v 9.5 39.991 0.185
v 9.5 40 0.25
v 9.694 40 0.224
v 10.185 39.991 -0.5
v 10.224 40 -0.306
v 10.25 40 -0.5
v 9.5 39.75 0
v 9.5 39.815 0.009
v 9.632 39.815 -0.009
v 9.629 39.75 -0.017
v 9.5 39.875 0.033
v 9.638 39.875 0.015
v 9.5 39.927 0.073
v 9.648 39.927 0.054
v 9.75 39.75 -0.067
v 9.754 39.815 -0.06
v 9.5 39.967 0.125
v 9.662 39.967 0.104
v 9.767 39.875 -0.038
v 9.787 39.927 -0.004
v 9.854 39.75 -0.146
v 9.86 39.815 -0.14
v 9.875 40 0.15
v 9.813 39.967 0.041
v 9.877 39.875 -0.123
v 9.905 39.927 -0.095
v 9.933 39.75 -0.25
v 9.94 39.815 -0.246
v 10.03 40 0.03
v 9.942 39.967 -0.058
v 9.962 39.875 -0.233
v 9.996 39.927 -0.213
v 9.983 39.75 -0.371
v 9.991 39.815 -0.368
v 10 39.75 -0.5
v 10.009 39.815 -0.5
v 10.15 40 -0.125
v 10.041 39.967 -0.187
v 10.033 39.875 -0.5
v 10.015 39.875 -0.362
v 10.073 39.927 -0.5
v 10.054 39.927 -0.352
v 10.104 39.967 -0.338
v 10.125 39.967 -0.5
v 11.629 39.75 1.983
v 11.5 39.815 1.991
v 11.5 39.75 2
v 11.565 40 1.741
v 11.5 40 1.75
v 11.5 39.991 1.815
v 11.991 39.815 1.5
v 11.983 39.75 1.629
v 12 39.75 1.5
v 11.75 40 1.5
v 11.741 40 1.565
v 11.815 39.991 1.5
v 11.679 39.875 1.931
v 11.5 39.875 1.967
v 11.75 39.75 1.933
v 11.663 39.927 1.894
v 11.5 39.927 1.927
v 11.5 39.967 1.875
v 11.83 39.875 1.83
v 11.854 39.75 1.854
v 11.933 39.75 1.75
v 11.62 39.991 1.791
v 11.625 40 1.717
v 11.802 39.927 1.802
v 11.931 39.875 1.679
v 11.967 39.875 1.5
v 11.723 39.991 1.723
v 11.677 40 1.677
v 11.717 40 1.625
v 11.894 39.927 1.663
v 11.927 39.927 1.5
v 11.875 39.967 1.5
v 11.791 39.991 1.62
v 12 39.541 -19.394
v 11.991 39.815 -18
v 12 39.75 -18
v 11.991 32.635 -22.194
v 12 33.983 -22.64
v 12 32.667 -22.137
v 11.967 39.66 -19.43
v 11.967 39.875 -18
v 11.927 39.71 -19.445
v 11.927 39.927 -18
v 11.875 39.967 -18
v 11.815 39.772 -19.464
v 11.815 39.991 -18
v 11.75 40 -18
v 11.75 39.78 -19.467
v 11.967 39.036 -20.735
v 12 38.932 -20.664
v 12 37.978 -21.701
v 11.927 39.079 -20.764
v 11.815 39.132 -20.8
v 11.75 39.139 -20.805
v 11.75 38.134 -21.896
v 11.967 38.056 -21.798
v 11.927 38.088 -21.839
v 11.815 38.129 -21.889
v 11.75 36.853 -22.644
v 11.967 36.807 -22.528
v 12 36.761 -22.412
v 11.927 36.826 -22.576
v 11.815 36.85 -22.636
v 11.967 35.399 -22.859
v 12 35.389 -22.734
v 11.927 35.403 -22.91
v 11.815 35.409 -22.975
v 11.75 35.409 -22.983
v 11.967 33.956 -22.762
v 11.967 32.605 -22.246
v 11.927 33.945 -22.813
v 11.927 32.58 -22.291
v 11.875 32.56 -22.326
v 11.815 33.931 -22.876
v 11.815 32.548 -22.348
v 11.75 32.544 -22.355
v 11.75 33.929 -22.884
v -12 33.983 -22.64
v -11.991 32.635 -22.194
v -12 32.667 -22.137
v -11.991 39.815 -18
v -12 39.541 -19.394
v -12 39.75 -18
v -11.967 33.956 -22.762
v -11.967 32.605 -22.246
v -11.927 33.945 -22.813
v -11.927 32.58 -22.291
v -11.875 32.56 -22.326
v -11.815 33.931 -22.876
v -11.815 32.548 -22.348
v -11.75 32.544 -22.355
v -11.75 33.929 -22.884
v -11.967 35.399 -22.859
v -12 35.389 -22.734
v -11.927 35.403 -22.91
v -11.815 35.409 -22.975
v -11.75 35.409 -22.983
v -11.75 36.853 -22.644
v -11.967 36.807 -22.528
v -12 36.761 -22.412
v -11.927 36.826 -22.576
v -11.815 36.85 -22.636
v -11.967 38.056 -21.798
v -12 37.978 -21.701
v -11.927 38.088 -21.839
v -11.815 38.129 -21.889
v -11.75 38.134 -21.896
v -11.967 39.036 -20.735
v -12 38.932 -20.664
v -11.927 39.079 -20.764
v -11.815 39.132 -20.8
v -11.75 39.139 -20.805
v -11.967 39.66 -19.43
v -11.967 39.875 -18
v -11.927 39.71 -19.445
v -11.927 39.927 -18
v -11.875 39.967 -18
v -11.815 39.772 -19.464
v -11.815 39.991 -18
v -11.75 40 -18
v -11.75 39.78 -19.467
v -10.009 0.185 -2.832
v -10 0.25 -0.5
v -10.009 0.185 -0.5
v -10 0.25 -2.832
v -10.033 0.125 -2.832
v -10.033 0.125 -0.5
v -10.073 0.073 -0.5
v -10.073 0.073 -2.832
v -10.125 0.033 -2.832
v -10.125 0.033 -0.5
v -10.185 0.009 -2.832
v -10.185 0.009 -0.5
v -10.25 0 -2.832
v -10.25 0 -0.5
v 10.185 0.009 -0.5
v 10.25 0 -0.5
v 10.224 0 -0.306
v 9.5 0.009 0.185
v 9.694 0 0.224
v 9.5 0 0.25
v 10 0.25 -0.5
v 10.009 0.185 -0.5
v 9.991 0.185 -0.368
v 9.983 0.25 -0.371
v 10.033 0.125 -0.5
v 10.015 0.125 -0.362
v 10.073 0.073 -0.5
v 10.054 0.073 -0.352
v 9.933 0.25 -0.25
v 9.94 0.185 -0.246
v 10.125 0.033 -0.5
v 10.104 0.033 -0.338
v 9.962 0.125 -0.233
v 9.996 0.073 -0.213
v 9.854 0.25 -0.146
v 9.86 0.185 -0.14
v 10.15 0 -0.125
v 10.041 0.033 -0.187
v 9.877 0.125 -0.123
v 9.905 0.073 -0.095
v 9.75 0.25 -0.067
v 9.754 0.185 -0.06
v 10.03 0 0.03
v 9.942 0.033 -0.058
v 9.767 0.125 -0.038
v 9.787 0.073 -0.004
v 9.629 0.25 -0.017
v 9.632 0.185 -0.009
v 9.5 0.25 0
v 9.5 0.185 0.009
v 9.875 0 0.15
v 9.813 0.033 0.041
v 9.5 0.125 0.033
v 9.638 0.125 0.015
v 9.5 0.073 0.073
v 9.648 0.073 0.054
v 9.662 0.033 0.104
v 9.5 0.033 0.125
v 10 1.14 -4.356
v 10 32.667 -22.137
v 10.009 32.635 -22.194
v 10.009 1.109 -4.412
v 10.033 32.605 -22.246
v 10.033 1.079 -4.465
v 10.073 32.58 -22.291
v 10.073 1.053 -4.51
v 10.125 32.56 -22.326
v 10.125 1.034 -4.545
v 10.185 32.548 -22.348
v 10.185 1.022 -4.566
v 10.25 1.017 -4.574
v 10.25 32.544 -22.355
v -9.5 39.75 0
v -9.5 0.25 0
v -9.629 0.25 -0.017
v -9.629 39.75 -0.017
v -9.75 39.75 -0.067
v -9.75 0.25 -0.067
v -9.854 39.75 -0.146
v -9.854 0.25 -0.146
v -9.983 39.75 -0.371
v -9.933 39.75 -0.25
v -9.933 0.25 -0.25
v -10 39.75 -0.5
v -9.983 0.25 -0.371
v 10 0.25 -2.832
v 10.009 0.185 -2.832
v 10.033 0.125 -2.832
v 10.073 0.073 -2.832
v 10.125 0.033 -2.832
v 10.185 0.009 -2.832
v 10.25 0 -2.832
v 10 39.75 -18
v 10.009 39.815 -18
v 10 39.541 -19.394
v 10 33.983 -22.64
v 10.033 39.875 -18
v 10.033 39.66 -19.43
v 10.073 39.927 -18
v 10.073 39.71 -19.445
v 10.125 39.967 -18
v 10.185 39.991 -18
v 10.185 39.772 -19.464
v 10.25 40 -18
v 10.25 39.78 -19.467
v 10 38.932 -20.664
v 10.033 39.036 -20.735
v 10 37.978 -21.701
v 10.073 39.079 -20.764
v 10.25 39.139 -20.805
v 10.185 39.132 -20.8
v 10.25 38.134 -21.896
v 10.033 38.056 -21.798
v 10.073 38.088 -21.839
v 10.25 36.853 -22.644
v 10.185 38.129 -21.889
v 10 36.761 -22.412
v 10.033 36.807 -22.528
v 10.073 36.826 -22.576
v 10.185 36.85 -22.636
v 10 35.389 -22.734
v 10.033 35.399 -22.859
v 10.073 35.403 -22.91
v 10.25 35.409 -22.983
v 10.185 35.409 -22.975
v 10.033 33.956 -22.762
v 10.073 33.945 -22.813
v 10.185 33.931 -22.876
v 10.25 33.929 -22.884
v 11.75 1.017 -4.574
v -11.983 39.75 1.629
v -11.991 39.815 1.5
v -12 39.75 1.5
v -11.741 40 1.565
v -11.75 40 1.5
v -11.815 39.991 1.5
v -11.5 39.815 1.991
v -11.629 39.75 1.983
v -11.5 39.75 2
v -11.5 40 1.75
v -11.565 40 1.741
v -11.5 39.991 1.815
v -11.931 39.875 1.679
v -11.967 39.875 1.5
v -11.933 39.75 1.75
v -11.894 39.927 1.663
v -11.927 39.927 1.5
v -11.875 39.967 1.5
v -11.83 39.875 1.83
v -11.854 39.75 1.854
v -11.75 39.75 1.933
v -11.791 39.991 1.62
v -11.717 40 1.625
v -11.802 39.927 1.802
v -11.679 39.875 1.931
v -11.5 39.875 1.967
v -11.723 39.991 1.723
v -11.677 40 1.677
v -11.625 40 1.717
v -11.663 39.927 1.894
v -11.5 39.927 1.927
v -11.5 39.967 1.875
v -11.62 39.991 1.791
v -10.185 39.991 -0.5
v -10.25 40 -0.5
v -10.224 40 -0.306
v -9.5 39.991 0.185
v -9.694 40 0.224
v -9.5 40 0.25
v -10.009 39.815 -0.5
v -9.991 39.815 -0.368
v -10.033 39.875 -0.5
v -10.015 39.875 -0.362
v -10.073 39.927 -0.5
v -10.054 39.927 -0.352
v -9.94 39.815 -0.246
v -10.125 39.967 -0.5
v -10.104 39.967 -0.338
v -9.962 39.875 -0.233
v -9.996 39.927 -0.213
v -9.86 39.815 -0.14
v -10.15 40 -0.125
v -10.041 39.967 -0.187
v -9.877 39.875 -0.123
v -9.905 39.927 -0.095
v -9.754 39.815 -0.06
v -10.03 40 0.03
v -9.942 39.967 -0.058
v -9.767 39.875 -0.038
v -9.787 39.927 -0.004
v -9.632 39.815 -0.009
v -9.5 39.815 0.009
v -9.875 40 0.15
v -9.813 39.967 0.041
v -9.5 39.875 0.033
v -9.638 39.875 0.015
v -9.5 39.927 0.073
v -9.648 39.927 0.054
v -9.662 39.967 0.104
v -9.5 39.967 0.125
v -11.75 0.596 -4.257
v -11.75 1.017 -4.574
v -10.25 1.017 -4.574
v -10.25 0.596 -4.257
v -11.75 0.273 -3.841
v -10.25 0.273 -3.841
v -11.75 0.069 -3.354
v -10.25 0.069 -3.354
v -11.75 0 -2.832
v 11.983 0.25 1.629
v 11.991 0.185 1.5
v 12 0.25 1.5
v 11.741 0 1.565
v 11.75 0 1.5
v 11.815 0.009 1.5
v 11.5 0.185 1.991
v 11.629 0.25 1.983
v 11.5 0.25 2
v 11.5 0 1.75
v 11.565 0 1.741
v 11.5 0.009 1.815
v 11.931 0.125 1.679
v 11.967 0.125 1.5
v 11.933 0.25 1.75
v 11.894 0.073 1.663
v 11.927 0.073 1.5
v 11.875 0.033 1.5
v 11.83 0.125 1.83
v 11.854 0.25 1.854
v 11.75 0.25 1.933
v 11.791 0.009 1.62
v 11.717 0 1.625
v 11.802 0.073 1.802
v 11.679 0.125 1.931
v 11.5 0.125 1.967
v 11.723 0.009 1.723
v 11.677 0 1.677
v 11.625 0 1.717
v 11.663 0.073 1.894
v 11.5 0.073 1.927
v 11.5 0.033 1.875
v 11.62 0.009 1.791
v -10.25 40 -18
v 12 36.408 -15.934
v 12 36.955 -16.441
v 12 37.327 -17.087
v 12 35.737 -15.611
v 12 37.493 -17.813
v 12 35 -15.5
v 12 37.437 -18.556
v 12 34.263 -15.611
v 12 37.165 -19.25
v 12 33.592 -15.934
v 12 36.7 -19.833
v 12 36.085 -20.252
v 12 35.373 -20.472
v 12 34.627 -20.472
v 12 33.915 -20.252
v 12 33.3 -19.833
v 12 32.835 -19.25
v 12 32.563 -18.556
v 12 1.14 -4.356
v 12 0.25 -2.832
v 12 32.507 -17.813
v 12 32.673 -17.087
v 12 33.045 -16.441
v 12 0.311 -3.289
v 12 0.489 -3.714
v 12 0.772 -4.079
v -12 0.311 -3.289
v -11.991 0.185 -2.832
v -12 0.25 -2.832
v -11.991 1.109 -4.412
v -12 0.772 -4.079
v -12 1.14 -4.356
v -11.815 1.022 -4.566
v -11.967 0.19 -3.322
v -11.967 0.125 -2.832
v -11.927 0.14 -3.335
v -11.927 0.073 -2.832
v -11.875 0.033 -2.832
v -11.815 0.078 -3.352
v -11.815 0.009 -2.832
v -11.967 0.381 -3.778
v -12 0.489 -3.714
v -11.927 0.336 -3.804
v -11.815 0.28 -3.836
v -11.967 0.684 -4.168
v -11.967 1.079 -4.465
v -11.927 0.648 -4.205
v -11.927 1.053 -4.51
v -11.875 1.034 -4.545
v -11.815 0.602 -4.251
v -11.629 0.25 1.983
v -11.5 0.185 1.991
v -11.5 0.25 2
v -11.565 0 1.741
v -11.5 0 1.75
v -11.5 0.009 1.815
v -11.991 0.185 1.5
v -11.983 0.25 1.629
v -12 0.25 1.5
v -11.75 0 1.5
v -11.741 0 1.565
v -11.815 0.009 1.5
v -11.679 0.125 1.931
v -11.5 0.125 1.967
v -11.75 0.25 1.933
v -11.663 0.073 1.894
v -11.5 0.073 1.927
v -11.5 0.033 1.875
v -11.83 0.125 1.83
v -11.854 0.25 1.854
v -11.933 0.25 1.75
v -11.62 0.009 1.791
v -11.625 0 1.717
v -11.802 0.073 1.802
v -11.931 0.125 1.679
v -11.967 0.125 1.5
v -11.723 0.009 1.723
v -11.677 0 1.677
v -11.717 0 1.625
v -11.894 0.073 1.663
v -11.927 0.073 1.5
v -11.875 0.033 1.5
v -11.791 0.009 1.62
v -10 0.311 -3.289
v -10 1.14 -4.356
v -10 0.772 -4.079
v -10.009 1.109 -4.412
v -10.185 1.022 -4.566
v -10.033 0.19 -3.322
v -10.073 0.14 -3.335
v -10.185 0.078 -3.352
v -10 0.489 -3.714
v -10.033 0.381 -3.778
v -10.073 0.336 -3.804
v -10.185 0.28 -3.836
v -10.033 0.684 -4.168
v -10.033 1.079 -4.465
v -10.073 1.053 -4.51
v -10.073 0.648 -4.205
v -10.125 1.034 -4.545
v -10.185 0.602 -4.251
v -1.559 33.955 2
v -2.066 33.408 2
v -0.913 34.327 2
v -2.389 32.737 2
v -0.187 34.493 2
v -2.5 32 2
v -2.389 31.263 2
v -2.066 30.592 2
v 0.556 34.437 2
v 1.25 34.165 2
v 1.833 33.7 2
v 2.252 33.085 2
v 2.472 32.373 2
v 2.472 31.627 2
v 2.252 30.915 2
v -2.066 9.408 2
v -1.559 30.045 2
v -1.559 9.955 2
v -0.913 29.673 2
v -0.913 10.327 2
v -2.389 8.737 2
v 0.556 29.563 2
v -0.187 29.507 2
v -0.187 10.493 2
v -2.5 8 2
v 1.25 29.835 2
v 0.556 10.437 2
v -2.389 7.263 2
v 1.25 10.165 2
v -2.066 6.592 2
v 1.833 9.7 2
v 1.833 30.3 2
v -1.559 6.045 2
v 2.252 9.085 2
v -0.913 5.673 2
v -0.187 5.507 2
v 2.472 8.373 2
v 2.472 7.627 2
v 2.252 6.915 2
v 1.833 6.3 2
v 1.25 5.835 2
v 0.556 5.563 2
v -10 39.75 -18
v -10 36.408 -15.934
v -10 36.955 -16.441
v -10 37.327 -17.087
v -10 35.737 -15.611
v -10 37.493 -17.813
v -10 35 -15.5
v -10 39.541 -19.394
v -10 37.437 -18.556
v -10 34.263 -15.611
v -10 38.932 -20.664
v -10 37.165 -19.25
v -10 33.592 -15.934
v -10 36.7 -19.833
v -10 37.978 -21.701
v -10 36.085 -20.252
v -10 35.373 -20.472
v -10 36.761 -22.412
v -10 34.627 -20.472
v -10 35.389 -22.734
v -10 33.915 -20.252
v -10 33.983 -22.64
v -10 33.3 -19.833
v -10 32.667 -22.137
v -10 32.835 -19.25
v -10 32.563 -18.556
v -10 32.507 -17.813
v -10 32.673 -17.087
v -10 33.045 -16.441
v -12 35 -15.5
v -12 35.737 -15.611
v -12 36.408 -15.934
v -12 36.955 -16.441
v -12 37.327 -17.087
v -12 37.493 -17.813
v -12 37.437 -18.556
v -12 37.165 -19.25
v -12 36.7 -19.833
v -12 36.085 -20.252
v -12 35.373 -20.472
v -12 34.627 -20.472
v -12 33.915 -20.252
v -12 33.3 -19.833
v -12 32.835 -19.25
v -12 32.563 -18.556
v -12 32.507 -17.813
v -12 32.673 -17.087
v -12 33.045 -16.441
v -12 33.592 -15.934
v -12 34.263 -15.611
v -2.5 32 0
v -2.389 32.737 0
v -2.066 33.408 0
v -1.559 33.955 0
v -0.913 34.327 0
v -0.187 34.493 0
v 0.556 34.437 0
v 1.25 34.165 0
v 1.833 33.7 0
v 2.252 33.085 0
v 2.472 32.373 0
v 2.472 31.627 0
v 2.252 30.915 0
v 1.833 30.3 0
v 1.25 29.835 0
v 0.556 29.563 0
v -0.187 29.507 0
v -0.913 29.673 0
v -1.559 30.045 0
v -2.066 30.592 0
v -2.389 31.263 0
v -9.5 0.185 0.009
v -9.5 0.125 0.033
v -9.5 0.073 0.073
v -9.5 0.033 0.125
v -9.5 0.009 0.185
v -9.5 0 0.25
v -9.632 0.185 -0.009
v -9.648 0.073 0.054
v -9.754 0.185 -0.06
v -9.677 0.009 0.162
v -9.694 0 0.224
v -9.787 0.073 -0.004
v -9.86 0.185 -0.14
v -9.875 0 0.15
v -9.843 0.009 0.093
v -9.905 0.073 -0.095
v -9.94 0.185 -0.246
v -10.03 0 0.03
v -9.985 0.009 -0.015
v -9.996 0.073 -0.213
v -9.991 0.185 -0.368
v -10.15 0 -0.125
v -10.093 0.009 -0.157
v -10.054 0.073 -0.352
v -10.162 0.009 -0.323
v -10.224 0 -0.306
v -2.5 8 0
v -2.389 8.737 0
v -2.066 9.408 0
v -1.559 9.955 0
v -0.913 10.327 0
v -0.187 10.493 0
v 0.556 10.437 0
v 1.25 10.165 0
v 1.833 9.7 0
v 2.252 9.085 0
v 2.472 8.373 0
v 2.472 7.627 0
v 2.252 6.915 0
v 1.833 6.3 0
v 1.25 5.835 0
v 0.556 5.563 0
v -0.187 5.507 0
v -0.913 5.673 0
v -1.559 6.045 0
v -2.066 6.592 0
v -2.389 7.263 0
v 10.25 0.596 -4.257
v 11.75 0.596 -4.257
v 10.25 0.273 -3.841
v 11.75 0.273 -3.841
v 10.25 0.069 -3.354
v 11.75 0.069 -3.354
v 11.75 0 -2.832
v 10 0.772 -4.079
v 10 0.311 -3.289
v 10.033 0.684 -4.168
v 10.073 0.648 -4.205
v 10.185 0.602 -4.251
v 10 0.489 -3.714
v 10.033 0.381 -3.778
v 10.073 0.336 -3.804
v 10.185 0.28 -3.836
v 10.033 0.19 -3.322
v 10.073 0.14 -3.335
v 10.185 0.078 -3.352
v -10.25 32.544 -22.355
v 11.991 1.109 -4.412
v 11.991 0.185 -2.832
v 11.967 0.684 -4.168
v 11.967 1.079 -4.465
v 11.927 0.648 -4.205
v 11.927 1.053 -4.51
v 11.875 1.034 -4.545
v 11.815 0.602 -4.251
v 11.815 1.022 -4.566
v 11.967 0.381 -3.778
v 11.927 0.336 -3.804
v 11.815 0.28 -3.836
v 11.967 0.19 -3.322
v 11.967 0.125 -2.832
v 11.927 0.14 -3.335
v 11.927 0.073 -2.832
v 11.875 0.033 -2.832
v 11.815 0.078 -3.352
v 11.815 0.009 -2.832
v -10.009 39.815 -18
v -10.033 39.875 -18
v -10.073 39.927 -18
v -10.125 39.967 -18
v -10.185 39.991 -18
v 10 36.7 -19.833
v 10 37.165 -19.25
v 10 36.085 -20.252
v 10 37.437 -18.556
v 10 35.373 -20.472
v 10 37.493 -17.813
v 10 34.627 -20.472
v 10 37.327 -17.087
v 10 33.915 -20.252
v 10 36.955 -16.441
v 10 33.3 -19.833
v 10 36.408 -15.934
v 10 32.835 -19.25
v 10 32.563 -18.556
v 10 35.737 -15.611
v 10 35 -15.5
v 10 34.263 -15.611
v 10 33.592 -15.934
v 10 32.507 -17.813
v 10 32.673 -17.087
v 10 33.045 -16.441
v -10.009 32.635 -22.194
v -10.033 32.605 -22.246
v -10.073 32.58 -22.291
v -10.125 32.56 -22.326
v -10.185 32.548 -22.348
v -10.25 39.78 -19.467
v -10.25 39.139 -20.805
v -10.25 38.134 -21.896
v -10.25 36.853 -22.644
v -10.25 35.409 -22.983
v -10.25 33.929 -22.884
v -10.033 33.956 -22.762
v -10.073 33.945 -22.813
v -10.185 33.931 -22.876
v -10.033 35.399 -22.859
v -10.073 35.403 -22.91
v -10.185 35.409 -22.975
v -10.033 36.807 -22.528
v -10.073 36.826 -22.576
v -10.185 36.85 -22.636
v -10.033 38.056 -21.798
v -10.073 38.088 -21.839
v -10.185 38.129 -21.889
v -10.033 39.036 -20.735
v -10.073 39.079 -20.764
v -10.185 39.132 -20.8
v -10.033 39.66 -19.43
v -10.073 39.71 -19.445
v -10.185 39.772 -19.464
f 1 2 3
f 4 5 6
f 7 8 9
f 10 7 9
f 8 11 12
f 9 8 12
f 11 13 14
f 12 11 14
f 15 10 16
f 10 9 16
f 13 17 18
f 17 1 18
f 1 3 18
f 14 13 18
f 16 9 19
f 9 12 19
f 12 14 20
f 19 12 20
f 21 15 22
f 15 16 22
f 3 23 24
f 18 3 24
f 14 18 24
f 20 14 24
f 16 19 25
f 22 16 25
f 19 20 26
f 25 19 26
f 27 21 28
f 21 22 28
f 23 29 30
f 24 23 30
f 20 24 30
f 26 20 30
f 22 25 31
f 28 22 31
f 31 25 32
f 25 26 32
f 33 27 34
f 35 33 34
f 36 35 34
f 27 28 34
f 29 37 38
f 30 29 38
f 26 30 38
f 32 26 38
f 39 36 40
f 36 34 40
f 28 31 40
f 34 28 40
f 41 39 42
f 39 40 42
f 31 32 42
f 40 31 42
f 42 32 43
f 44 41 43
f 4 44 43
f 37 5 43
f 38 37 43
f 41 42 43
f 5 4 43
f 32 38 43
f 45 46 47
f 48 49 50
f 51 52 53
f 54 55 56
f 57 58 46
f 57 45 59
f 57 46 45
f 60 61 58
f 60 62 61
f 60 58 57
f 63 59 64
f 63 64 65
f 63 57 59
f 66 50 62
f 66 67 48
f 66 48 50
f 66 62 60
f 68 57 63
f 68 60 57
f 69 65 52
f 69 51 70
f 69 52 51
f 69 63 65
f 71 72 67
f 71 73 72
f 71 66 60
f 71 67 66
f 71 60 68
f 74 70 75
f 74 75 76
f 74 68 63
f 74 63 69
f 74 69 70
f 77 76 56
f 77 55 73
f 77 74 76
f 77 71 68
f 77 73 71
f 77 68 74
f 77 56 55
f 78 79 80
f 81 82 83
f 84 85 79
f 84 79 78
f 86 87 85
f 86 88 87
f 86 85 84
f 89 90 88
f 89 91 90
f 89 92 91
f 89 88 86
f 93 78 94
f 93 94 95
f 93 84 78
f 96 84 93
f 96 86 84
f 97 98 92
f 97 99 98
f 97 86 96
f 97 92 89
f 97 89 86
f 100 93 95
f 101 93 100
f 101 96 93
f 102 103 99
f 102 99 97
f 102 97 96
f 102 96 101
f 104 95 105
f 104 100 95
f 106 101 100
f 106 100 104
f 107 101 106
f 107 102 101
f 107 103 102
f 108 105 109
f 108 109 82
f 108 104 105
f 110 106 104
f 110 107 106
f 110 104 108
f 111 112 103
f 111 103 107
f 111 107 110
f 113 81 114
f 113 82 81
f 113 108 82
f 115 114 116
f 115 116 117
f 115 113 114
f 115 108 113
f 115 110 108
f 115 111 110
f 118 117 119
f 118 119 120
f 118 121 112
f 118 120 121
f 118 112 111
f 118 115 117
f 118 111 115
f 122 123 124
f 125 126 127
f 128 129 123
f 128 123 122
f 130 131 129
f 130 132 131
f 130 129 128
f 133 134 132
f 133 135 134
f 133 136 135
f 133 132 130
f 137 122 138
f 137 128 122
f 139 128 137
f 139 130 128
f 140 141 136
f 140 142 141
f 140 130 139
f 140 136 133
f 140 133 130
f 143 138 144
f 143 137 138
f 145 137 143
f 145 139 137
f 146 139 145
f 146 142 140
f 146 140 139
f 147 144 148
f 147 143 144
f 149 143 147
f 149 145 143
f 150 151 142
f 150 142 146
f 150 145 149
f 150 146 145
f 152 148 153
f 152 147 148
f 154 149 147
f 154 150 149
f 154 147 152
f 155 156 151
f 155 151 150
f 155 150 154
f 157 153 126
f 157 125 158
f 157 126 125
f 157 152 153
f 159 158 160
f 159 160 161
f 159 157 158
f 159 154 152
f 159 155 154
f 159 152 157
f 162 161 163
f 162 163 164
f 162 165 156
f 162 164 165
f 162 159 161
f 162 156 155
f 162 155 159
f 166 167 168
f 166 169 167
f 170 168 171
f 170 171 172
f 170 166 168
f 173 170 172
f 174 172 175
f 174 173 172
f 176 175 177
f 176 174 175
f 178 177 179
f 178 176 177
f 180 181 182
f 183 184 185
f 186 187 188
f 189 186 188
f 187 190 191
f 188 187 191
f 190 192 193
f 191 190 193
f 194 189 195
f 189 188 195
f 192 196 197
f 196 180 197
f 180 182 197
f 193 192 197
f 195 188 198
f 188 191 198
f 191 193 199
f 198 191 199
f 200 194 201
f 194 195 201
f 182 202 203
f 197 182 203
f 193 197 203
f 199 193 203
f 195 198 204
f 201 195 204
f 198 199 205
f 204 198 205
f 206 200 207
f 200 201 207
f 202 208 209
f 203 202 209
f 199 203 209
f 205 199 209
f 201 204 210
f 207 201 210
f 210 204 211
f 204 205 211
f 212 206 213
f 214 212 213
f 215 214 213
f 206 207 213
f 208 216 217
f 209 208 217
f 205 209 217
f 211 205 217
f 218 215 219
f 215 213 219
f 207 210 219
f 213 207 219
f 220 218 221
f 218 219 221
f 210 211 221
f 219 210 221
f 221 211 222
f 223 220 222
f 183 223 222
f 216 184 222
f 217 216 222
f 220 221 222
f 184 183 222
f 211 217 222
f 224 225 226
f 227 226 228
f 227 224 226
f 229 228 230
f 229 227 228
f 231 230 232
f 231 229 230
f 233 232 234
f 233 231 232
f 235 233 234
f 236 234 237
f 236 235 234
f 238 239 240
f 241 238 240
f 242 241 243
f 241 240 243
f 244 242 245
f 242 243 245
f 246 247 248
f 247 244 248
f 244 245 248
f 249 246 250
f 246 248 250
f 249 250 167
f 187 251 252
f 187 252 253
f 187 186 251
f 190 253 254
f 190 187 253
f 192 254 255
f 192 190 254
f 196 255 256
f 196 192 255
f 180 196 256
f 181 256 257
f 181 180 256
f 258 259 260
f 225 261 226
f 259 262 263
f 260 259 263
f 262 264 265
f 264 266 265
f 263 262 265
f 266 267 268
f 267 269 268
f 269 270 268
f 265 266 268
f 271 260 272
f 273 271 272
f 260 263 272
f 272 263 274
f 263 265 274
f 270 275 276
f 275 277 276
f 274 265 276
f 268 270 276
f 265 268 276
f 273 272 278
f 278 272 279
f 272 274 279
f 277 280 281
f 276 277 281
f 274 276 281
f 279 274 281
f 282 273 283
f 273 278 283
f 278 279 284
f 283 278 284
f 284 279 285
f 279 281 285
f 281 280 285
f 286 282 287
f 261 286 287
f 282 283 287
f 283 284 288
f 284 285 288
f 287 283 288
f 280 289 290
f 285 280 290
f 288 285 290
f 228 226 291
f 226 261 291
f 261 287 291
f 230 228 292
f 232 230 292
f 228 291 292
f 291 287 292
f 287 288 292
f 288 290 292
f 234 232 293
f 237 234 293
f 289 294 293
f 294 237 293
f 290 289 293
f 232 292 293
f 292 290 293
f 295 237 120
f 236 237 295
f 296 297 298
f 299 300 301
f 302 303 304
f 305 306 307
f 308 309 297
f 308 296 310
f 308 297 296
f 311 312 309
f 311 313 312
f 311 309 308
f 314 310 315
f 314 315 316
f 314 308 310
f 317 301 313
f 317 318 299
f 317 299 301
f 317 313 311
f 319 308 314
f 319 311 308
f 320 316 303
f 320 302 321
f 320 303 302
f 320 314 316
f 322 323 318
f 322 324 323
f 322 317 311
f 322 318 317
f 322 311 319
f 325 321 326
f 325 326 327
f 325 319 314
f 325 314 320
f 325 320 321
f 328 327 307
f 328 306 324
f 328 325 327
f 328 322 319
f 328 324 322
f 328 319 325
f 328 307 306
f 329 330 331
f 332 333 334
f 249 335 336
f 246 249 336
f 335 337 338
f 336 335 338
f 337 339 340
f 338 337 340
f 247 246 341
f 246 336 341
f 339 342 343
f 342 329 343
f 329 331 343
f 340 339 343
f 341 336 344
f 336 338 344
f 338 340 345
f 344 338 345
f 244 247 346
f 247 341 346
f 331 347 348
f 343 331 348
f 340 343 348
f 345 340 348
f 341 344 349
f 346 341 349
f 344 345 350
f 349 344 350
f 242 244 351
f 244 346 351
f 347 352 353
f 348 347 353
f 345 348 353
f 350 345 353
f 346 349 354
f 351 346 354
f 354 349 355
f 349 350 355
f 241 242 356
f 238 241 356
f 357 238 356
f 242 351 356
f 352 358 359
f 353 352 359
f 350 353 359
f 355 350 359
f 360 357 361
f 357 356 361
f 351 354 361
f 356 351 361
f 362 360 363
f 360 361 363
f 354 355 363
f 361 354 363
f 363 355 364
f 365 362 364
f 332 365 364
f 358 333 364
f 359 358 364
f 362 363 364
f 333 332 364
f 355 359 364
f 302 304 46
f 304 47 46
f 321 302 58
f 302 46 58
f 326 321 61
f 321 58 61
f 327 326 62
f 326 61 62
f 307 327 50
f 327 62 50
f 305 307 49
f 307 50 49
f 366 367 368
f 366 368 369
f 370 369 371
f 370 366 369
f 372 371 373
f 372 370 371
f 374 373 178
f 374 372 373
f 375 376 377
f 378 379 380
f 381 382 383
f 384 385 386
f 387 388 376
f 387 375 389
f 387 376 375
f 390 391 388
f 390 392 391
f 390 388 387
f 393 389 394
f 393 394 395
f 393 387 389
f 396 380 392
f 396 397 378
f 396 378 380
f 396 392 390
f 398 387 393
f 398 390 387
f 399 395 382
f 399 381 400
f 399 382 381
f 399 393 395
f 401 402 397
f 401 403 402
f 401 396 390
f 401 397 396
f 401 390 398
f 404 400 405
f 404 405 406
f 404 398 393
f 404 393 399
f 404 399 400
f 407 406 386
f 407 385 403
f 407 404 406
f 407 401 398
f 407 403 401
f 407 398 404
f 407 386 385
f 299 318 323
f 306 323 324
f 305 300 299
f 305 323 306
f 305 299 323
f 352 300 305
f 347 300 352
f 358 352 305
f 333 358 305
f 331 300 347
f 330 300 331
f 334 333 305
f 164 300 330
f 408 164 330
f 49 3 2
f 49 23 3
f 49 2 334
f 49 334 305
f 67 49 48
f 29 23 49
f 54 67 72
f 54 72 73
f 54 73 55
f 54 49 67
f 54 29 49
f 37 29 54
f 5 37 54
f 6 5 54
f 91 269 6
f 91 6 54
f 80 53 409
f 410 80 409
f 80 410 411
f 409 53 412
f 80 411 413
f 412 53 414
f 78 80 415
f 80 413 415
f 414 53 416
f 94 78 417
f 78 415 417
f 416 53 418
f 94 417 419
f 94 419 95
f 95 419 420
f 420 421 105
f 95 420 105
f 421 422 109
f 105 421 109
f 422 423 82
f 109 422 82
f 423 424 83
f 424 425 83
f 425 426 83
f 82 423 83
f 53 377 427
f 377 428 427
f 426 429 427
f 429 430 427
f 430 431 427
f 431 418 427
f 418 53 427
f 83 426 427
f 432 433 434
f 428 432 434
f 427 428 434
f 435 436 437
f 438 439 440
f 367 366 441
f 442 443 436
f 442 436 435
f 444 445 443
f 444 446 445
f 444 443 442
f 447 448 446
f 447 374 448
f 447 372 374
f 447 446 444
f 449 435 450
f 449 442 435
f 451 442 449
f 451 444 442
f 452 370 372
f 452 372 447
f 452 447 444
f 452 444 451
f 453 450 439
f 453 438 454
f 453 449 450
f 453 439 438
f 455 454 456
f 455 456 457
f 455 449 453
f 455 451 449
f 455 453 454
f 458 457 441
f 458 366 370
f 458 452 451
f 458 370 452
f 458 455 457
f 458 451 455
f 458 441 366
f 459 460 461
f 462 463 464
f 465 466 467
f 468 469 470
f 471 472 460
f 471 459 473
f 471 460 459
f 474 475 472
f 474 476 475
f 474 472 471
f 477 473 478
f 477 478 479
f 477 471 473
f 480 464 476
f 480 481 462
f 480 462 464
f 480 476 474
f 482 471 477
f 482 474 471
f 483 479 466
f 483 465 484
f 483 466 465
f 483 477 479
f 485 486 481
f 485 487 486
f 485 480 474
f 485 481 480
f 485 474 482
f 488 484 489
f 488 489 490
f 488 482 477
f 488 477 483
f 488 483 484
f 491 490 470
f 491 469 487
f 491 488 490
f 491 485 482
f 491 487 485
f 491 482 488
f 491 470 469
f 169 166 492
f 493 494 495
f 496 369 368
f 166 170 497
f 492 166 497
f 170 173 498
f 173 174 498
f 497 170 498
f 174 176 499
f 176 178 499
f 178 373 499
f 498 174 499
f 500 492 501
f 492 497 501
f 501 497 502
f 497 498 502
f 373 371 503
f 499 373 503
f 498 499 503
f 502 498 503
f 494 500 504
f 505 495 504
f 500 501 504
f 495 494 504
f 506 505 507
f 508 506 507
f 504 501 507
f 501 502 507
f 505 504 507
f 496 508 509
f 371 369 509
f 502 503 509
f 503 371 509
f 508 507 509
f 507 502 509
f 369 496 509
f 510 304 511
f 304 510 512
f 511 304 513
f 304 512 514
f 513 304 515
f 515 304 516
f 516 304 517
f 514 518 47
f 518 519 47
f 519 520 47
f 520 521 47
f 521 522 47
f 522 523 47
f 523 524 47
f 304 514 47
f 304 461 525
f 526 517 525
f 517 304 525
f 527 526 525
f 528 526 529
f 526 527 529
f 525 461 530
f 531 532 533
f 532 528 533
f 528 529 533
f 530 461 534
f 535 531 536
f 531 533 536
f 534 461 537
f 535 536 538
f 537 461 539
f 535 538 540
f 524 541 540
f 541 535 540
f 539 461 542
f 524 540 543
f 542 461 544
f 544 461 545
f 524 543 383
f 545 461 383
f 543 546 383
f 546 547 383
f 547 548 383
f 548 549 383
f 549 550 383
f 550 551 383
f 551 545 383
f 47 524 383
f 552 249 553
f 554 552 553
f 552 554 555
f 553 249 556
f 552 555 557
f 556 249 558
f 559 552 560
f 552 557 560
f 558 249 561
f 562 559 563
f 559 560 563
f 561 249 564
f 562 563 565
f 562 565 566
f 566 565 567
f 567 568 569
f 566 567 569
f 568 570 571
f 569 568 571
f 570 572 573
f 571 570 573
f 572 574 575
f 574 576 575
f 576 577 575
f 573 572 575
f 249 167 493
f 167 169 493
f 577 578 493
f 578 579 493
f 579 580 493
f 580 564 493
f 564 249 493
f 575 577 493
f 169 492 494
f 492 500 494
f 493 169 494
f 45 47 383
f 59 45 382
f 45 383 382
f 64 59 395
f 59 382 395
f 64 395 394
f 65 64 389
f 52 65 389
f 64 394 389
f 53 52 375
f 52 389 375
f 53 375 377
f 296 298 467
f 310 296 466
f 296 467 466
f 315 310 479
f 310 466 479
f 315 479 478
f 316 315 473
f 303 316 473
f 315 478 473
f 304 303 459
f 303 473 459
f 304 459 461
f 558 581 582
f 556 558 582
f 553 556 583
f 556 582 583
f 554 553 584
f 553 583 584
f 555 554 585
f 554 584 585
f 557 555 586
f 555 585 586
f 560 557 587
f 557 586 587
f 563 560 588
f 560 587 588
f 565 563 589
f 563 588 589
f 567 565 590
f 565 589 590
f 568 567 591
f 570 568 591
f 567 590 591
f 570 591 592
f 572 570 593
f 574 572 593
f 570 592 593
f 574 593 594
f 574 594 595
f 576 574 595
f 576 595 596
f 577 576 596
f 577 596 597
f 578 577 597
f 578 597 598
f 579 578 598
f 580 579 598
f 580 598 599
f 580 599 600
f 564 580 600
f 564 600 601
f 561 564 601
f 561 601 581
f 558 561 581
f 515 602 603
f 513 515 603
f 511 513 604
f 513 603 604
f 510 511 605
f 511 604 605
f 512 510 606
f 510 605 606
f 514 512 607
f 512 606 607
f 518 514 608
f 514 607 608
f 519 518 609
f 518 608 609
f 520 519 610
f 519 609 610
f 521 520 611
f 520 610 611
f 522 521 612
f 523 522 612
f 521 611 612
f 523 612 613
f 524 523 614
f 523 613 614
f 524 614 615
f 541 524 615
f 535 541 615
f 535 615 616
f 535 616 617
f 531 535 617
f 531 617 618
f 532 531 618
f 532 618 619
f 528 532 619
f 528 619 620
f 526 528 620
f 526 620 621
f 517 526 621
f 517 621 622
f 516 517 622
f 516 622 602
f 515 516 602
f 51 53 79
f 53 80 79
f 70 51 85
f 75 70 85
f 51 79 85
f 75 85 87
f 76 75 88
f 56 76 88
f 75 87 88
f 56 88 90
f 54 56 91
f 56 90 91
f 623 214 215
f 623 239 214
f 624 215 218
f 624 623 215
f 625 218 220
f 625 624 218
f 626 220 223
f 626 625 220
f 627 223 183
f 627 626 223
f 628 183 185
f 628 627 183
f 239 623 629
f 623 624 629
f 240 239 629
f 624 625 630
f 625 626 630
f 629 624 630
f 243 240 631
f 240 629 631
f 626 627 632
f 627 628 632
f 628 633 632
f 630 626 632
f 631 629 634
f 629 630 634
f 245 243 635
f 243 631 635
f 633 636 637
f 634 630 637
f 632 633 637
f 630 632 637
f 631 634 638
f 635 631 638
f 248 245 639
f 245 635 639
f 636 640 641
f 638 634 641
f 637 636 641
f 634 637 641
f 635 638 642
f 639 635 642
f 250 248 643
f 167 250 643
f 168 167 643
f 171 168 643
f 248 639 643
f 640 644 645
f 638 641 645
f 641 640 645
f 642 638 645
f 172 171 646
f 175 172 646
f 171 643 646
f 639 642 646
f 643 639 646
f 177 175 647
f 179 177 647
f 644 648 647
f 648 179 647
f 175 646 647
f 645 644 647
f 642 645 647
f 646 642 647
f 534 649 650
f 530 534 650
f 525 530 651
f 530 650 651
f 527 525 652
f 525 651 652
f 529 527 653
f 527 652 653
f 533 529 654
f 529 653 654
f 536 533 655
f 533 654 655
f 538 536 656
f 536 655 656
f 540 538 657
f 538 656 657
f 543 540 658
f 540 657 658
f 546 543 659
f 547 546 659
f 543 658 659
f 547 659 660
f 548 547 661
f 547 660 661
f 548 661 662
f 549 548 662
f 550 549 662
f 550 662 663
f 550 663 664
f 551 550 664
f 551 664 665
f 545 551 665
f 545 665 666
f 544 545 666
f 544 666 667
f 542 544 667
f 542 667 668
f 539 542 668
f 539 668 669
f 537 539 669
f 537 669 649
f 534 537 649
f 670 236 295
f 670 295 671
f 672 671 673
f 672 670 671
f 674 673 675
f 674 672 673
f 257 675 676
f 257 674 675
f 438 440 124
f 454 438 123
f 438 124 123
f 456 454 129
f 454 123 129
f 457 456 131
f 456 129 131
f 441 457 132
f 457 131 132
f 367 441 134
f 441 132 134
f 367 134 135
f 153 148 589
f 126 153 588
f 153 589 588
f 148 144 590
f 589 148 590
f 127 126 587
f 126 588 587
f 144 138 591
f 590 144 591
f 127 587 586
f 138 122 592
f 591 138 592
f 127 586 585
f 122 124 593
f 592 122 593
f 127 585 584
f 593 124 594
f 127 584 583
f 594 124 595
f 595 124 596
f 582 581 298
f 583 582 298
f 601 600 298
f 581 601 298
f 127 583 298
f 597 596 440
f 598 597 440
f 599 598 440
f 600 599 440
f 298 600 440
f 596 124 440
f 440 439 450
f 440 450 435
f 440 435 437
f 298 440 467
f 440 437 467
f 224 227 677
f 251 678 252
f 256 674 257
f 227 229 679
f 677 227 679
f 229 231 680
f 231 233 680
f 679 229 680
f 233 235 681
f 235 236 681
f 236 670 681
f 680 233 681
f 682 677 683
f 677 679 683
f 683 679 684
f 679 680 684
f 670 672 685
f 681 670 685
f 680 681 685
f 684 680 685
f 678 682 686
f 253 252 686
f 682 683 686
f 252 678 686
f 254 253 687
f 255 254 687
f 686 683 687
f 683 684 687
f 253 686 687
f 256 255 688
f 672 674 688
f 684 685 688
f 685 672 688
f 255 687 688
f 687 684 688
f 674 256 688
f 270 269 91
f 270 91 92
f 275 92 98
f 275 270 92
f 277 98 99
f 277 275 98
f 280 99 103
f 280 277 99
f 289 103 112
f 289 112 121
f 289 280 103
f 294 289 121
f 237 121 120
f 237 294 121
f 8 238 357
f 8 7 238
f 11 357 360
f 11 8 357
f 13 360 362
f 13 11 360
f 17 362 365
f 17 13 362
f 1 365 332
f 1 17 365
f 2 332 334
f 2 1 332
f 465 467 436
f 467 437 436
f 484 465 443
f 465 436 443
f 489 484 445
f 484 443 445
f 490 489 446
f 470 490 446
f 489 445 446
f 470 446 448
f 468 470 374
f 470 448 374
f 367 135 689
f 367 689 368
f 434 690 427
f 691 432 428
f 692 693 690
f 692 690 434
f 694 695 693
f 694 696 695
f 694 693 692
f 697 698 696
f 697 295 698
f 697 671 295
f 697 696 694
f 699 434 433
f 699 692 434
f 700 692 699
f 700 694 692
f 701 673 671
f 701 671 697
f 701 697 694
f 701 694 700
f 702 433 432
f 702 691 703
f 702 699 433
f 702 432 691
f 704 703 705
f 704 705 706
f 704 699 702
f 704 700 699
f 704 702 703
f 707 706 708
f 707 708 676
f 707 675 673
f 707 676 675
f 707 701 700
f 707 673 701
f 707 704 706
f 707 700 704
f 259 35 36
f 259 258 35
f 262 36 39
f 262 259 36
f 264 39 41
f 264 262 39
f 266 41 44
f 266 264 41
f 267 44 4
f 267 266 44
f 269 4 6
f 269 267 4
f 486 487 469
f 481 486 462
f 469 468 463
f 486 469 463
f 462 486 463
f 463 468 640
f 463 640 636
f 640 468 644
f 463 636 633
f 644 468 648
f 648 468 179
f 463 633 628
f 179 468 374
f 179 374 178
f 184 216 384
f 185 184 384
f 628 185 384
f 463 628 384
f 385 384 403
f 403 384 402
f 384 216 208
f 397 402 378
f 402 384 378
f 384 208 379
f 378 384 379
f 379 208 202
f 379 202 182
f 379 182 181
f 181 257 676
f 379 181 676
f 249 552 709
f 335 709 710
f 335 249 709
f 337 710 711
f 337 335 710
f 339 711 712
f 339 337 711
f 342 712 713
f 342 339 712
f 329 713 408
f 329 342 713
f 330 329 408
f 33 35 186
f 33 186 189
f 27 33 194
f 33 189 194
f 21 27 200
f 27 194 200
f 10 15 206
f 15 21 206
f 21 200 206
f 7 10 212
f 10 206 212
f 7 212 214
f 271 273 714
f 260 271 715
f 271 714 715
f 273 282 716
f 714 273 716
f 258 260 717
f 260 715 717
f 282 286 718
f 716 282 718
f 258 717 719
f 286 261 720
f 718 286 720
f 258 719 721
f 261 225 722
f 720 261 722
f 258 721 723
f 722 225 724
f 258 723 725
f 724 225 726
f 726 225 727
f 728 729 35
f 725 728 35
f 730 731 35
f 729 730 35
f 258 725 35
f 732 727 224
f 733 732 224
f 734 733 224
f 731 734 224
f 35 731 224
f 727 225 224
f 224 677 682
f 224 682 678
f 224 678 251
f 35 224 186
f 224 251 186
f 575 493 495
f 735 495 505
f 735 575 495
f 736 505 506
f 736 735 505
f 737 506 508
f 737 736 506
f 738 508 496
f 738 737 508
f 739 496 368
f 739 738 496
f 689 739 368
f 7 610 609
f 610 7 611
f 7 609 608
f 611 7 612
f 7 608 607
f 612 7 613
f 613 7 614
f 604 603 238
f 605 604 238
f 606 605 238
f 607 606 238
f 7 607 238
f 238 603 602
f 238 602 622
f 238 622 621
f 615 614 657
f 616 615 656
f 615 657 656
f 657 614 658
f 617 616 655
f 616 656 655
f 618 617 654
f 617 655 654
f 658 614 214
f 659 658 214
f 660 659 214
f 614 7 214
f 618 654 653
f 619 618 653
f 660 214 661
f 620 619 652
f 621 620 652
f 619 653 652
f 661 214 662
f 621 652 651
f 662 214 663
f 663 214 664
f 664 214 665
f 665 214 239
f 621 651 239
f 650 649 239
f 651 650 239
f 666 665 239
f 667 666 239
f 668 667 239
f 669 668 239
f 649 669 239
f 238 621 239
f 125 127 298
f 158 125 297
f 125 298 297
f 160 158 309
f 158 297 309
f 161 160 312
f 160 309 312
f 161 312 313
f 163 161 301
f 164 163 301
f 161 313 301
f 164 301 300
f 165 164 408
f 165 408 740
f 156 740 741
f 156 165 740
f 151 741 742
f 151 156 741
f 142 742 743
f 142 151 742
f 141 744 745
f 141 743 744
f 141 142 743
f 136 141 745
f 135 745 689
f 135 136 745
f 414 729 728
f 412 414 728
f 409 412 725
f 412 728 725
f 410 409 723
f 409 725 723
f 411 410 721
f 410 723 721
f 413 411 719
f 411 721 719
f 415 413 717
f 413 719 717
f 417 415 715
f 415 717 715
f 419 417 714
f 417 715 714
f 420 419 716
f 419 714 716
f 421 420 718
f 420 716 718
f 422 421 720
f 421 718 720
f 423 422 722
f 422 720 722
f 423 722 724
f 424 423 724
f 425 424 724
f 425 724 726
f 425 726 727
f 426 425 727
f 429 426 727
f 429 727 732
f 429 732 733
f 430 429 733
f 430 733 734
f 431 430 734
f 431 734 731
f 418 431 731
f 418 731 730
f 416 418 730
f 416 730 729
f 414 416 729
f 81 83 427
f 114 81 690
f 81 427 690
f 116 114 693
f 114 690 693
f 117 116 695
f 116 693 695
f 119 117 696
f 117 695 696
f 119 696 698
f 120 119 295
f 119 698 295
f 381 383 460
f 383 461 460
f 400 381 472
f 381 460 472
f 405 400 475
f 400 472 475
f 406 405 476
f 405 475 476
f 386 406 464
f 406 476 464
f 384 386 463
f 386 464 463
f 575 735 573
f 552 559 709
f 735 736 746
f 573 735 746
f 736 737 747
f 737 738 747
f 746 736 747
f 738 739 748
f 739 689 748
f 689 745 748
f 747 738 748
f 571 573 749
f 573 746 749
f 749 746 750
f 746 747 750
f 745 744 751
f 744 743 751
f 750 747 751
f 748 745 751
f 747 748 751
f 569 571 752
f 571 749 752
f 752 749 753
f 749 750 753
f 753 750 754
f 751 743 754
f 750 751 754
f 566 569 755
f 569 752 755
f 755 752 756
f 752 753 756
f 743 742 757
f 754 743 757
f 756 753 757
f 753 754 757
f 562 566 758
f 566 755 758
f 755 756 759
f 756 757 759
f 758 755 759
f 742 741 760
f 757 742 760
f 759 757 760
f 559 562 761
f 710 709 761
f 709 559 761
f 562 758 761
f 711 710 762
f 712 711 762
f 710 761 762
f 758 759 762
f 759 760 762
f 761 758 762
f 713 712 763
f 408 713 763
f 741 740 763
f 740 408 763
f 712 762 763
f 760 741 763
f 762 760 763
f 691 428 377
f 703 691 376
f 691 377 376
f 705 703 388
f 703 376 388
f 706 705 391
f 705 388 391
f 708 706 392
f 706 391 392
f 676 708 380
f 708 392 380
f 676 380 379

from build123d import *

# Parameters (mm, degrees)
BOSS_EXTRUDE1_DEPTH = 40
SKETCH2_OUTSIDE_W   = 37.584
SKETCH2_OUTSIDE_H   = 52.584
CUT_EXTRUDE1_DEPTH  = 30
FILLET1_R           = 0.25
SKETCH3_R           = 2.5
CUT_EXTRUDE2_DEPTH  = 40
SKETCH4_R           = 2.5
CUT_EXTRUDE3_DEPTH  = 30


with BuildPart() as part:
    # Sketch1 → Boss-Extrude1 (new body)
    with BuildSketch(Plane(origin=(0, 0, 0), x_dir=(1, 0, 0), z_dir=(0, 1, 0))):
        with BuildLine():
            Line((12, -1.5), (12, 23))
            Line((12, 23), (10, 23))
            Line((10, 23), (10, 0.5))
            ThreePointArc((10, 0.5), (9.853553391, 0.146446609), (9.5, 0))
            Line((9.5, 0), (-9.5, 0))
            ThreePointArc((-9.5, 0), (-9.853553391, 0.146446609), (-10, 0.5))
            Line((-10, 0.5), (-10, 23))
            Line((-10, 23), (-12, 23))
            Line((-12, 23), (-12, -1.5))
            ThreePointArc((-12, -1.5), (-11.853553391, -1.853553391), (-11.5, -2))
            Line((-11.5, -2), (11.5, -2))
            ThreePointArc((11.5, -2), (11.853553391, -1.853553391), (12, -1.5))
        make_face()
    extrude(amount=BOSS_EXTRUDE1_DEPTH)

    # Sketch2 outside → Cut-Extrude1 (cut)
    with BuildSketch(Plane.ZY.offset(12)):
        with Locations((-10.5, 20)):
            Rectangle(SKETCH2_OUTSIDE_W, SKETCH2_OUTSIDE_H)
        with BuildLine():
            Line((-22.35505953, 32.543690474), (-4.573869643, 1.017476189))
            ThreePointArc((-4.573869643, 1.017476189), (-3.840546078, 0.273001502), (-2.831845831, 0))
            Line((-2.831845831, 0), (2, 0))
            Line((2, 0), (2, 40))
            Line((2, 40), (-18, 40))
            ThreePointArc((-18, 40), (-22.317496244, 37.521750619), (-22.35505953, 32.543690474))
        make_face(mode=Mode.SUBTRACT)
    extrude(amount=-CUT_EXTRUDE1_DEPTH, mode=Mode.SUBTRACT)

    # Fillet1
    fillet1_edges = [part.edges().sort_by_distance(p)[0] for p in [
        (-10, 0, -1.665922915),
        (-9.853553391, 0, -0.146446609),
        (-11.853553391, 40, 1.853553391),
        (0, 0, 0),
        (9.853553391, 0, -0.146446609),
        (12, 0, -0.665922915),
        (11.853553391, 0, 1.853553391),
        (0, 0, 2),
        (-11.853553391, 0, 1.853553391),
        (0, 40, 2),
        (11.853553391, 40, 1.853553391),
        (12, 40, -8.25),
        (10, 0, -1.665922915),
        (9.853553391, 40, -0.146446609),
        (-12, 0, -0.665922915),
        (-12, 40, -8.25),
        (10, 40, -9.25),
        (0, 40, 0),
        (-10, 16.780583332, -13.464464586),
        (-9.853553391, 40, -0.146446609),
        (-10, 40, -9.25),
        (12, 16.780583332, -13.464464586),
        (-12, 16.780583332, -13.464464586),
        (-12, 37.521750619, -22.317496244),
        (12, 37.521750619, -22.317496244),
        (12, 0.273001502, -3.840546078),
        (-12, 0.273001502, -3.840546078),
        (10, 37.521750619, -22.317496244),
        (-10, 37.521750619, -22.317496244),
        (10, 0.273001502, -3.840546078),
        (-10, 0.273001502, -3.840546078),
        (10, 16.780583332, -13.464464586),
    ]]
    fillet(fillet1_edges, radius=FILLET1_R)

    # Sketch3 → Cut-Extrude2 (cut)
    with BuildSketch(Plane.ZY.offset(12)):
        with Locations((-18, 35)):
            Circle(SKETCH3_R)
    extrude(amount=-CUT_EXTRUDE2_DEPTH, mode=Mode.SUBTRACT)

    # Sketch4 → Cut-Extrude3 (cut)
    with BuildSketch(Plane(origin=(0, 0, 0), x_dir=(-1, 0, 0), z_dir=(0, 0, -1))):
        with Locations((0, 32)):
            Circle(SKETCH4_R)
        with Locations((0, 8)):
            Circle(SKETCH4_R)
    extrude(amount=-CUT_EXTRUDE3_DEPTH, mode=Mode.SUBTRACT)


solid = part.part
